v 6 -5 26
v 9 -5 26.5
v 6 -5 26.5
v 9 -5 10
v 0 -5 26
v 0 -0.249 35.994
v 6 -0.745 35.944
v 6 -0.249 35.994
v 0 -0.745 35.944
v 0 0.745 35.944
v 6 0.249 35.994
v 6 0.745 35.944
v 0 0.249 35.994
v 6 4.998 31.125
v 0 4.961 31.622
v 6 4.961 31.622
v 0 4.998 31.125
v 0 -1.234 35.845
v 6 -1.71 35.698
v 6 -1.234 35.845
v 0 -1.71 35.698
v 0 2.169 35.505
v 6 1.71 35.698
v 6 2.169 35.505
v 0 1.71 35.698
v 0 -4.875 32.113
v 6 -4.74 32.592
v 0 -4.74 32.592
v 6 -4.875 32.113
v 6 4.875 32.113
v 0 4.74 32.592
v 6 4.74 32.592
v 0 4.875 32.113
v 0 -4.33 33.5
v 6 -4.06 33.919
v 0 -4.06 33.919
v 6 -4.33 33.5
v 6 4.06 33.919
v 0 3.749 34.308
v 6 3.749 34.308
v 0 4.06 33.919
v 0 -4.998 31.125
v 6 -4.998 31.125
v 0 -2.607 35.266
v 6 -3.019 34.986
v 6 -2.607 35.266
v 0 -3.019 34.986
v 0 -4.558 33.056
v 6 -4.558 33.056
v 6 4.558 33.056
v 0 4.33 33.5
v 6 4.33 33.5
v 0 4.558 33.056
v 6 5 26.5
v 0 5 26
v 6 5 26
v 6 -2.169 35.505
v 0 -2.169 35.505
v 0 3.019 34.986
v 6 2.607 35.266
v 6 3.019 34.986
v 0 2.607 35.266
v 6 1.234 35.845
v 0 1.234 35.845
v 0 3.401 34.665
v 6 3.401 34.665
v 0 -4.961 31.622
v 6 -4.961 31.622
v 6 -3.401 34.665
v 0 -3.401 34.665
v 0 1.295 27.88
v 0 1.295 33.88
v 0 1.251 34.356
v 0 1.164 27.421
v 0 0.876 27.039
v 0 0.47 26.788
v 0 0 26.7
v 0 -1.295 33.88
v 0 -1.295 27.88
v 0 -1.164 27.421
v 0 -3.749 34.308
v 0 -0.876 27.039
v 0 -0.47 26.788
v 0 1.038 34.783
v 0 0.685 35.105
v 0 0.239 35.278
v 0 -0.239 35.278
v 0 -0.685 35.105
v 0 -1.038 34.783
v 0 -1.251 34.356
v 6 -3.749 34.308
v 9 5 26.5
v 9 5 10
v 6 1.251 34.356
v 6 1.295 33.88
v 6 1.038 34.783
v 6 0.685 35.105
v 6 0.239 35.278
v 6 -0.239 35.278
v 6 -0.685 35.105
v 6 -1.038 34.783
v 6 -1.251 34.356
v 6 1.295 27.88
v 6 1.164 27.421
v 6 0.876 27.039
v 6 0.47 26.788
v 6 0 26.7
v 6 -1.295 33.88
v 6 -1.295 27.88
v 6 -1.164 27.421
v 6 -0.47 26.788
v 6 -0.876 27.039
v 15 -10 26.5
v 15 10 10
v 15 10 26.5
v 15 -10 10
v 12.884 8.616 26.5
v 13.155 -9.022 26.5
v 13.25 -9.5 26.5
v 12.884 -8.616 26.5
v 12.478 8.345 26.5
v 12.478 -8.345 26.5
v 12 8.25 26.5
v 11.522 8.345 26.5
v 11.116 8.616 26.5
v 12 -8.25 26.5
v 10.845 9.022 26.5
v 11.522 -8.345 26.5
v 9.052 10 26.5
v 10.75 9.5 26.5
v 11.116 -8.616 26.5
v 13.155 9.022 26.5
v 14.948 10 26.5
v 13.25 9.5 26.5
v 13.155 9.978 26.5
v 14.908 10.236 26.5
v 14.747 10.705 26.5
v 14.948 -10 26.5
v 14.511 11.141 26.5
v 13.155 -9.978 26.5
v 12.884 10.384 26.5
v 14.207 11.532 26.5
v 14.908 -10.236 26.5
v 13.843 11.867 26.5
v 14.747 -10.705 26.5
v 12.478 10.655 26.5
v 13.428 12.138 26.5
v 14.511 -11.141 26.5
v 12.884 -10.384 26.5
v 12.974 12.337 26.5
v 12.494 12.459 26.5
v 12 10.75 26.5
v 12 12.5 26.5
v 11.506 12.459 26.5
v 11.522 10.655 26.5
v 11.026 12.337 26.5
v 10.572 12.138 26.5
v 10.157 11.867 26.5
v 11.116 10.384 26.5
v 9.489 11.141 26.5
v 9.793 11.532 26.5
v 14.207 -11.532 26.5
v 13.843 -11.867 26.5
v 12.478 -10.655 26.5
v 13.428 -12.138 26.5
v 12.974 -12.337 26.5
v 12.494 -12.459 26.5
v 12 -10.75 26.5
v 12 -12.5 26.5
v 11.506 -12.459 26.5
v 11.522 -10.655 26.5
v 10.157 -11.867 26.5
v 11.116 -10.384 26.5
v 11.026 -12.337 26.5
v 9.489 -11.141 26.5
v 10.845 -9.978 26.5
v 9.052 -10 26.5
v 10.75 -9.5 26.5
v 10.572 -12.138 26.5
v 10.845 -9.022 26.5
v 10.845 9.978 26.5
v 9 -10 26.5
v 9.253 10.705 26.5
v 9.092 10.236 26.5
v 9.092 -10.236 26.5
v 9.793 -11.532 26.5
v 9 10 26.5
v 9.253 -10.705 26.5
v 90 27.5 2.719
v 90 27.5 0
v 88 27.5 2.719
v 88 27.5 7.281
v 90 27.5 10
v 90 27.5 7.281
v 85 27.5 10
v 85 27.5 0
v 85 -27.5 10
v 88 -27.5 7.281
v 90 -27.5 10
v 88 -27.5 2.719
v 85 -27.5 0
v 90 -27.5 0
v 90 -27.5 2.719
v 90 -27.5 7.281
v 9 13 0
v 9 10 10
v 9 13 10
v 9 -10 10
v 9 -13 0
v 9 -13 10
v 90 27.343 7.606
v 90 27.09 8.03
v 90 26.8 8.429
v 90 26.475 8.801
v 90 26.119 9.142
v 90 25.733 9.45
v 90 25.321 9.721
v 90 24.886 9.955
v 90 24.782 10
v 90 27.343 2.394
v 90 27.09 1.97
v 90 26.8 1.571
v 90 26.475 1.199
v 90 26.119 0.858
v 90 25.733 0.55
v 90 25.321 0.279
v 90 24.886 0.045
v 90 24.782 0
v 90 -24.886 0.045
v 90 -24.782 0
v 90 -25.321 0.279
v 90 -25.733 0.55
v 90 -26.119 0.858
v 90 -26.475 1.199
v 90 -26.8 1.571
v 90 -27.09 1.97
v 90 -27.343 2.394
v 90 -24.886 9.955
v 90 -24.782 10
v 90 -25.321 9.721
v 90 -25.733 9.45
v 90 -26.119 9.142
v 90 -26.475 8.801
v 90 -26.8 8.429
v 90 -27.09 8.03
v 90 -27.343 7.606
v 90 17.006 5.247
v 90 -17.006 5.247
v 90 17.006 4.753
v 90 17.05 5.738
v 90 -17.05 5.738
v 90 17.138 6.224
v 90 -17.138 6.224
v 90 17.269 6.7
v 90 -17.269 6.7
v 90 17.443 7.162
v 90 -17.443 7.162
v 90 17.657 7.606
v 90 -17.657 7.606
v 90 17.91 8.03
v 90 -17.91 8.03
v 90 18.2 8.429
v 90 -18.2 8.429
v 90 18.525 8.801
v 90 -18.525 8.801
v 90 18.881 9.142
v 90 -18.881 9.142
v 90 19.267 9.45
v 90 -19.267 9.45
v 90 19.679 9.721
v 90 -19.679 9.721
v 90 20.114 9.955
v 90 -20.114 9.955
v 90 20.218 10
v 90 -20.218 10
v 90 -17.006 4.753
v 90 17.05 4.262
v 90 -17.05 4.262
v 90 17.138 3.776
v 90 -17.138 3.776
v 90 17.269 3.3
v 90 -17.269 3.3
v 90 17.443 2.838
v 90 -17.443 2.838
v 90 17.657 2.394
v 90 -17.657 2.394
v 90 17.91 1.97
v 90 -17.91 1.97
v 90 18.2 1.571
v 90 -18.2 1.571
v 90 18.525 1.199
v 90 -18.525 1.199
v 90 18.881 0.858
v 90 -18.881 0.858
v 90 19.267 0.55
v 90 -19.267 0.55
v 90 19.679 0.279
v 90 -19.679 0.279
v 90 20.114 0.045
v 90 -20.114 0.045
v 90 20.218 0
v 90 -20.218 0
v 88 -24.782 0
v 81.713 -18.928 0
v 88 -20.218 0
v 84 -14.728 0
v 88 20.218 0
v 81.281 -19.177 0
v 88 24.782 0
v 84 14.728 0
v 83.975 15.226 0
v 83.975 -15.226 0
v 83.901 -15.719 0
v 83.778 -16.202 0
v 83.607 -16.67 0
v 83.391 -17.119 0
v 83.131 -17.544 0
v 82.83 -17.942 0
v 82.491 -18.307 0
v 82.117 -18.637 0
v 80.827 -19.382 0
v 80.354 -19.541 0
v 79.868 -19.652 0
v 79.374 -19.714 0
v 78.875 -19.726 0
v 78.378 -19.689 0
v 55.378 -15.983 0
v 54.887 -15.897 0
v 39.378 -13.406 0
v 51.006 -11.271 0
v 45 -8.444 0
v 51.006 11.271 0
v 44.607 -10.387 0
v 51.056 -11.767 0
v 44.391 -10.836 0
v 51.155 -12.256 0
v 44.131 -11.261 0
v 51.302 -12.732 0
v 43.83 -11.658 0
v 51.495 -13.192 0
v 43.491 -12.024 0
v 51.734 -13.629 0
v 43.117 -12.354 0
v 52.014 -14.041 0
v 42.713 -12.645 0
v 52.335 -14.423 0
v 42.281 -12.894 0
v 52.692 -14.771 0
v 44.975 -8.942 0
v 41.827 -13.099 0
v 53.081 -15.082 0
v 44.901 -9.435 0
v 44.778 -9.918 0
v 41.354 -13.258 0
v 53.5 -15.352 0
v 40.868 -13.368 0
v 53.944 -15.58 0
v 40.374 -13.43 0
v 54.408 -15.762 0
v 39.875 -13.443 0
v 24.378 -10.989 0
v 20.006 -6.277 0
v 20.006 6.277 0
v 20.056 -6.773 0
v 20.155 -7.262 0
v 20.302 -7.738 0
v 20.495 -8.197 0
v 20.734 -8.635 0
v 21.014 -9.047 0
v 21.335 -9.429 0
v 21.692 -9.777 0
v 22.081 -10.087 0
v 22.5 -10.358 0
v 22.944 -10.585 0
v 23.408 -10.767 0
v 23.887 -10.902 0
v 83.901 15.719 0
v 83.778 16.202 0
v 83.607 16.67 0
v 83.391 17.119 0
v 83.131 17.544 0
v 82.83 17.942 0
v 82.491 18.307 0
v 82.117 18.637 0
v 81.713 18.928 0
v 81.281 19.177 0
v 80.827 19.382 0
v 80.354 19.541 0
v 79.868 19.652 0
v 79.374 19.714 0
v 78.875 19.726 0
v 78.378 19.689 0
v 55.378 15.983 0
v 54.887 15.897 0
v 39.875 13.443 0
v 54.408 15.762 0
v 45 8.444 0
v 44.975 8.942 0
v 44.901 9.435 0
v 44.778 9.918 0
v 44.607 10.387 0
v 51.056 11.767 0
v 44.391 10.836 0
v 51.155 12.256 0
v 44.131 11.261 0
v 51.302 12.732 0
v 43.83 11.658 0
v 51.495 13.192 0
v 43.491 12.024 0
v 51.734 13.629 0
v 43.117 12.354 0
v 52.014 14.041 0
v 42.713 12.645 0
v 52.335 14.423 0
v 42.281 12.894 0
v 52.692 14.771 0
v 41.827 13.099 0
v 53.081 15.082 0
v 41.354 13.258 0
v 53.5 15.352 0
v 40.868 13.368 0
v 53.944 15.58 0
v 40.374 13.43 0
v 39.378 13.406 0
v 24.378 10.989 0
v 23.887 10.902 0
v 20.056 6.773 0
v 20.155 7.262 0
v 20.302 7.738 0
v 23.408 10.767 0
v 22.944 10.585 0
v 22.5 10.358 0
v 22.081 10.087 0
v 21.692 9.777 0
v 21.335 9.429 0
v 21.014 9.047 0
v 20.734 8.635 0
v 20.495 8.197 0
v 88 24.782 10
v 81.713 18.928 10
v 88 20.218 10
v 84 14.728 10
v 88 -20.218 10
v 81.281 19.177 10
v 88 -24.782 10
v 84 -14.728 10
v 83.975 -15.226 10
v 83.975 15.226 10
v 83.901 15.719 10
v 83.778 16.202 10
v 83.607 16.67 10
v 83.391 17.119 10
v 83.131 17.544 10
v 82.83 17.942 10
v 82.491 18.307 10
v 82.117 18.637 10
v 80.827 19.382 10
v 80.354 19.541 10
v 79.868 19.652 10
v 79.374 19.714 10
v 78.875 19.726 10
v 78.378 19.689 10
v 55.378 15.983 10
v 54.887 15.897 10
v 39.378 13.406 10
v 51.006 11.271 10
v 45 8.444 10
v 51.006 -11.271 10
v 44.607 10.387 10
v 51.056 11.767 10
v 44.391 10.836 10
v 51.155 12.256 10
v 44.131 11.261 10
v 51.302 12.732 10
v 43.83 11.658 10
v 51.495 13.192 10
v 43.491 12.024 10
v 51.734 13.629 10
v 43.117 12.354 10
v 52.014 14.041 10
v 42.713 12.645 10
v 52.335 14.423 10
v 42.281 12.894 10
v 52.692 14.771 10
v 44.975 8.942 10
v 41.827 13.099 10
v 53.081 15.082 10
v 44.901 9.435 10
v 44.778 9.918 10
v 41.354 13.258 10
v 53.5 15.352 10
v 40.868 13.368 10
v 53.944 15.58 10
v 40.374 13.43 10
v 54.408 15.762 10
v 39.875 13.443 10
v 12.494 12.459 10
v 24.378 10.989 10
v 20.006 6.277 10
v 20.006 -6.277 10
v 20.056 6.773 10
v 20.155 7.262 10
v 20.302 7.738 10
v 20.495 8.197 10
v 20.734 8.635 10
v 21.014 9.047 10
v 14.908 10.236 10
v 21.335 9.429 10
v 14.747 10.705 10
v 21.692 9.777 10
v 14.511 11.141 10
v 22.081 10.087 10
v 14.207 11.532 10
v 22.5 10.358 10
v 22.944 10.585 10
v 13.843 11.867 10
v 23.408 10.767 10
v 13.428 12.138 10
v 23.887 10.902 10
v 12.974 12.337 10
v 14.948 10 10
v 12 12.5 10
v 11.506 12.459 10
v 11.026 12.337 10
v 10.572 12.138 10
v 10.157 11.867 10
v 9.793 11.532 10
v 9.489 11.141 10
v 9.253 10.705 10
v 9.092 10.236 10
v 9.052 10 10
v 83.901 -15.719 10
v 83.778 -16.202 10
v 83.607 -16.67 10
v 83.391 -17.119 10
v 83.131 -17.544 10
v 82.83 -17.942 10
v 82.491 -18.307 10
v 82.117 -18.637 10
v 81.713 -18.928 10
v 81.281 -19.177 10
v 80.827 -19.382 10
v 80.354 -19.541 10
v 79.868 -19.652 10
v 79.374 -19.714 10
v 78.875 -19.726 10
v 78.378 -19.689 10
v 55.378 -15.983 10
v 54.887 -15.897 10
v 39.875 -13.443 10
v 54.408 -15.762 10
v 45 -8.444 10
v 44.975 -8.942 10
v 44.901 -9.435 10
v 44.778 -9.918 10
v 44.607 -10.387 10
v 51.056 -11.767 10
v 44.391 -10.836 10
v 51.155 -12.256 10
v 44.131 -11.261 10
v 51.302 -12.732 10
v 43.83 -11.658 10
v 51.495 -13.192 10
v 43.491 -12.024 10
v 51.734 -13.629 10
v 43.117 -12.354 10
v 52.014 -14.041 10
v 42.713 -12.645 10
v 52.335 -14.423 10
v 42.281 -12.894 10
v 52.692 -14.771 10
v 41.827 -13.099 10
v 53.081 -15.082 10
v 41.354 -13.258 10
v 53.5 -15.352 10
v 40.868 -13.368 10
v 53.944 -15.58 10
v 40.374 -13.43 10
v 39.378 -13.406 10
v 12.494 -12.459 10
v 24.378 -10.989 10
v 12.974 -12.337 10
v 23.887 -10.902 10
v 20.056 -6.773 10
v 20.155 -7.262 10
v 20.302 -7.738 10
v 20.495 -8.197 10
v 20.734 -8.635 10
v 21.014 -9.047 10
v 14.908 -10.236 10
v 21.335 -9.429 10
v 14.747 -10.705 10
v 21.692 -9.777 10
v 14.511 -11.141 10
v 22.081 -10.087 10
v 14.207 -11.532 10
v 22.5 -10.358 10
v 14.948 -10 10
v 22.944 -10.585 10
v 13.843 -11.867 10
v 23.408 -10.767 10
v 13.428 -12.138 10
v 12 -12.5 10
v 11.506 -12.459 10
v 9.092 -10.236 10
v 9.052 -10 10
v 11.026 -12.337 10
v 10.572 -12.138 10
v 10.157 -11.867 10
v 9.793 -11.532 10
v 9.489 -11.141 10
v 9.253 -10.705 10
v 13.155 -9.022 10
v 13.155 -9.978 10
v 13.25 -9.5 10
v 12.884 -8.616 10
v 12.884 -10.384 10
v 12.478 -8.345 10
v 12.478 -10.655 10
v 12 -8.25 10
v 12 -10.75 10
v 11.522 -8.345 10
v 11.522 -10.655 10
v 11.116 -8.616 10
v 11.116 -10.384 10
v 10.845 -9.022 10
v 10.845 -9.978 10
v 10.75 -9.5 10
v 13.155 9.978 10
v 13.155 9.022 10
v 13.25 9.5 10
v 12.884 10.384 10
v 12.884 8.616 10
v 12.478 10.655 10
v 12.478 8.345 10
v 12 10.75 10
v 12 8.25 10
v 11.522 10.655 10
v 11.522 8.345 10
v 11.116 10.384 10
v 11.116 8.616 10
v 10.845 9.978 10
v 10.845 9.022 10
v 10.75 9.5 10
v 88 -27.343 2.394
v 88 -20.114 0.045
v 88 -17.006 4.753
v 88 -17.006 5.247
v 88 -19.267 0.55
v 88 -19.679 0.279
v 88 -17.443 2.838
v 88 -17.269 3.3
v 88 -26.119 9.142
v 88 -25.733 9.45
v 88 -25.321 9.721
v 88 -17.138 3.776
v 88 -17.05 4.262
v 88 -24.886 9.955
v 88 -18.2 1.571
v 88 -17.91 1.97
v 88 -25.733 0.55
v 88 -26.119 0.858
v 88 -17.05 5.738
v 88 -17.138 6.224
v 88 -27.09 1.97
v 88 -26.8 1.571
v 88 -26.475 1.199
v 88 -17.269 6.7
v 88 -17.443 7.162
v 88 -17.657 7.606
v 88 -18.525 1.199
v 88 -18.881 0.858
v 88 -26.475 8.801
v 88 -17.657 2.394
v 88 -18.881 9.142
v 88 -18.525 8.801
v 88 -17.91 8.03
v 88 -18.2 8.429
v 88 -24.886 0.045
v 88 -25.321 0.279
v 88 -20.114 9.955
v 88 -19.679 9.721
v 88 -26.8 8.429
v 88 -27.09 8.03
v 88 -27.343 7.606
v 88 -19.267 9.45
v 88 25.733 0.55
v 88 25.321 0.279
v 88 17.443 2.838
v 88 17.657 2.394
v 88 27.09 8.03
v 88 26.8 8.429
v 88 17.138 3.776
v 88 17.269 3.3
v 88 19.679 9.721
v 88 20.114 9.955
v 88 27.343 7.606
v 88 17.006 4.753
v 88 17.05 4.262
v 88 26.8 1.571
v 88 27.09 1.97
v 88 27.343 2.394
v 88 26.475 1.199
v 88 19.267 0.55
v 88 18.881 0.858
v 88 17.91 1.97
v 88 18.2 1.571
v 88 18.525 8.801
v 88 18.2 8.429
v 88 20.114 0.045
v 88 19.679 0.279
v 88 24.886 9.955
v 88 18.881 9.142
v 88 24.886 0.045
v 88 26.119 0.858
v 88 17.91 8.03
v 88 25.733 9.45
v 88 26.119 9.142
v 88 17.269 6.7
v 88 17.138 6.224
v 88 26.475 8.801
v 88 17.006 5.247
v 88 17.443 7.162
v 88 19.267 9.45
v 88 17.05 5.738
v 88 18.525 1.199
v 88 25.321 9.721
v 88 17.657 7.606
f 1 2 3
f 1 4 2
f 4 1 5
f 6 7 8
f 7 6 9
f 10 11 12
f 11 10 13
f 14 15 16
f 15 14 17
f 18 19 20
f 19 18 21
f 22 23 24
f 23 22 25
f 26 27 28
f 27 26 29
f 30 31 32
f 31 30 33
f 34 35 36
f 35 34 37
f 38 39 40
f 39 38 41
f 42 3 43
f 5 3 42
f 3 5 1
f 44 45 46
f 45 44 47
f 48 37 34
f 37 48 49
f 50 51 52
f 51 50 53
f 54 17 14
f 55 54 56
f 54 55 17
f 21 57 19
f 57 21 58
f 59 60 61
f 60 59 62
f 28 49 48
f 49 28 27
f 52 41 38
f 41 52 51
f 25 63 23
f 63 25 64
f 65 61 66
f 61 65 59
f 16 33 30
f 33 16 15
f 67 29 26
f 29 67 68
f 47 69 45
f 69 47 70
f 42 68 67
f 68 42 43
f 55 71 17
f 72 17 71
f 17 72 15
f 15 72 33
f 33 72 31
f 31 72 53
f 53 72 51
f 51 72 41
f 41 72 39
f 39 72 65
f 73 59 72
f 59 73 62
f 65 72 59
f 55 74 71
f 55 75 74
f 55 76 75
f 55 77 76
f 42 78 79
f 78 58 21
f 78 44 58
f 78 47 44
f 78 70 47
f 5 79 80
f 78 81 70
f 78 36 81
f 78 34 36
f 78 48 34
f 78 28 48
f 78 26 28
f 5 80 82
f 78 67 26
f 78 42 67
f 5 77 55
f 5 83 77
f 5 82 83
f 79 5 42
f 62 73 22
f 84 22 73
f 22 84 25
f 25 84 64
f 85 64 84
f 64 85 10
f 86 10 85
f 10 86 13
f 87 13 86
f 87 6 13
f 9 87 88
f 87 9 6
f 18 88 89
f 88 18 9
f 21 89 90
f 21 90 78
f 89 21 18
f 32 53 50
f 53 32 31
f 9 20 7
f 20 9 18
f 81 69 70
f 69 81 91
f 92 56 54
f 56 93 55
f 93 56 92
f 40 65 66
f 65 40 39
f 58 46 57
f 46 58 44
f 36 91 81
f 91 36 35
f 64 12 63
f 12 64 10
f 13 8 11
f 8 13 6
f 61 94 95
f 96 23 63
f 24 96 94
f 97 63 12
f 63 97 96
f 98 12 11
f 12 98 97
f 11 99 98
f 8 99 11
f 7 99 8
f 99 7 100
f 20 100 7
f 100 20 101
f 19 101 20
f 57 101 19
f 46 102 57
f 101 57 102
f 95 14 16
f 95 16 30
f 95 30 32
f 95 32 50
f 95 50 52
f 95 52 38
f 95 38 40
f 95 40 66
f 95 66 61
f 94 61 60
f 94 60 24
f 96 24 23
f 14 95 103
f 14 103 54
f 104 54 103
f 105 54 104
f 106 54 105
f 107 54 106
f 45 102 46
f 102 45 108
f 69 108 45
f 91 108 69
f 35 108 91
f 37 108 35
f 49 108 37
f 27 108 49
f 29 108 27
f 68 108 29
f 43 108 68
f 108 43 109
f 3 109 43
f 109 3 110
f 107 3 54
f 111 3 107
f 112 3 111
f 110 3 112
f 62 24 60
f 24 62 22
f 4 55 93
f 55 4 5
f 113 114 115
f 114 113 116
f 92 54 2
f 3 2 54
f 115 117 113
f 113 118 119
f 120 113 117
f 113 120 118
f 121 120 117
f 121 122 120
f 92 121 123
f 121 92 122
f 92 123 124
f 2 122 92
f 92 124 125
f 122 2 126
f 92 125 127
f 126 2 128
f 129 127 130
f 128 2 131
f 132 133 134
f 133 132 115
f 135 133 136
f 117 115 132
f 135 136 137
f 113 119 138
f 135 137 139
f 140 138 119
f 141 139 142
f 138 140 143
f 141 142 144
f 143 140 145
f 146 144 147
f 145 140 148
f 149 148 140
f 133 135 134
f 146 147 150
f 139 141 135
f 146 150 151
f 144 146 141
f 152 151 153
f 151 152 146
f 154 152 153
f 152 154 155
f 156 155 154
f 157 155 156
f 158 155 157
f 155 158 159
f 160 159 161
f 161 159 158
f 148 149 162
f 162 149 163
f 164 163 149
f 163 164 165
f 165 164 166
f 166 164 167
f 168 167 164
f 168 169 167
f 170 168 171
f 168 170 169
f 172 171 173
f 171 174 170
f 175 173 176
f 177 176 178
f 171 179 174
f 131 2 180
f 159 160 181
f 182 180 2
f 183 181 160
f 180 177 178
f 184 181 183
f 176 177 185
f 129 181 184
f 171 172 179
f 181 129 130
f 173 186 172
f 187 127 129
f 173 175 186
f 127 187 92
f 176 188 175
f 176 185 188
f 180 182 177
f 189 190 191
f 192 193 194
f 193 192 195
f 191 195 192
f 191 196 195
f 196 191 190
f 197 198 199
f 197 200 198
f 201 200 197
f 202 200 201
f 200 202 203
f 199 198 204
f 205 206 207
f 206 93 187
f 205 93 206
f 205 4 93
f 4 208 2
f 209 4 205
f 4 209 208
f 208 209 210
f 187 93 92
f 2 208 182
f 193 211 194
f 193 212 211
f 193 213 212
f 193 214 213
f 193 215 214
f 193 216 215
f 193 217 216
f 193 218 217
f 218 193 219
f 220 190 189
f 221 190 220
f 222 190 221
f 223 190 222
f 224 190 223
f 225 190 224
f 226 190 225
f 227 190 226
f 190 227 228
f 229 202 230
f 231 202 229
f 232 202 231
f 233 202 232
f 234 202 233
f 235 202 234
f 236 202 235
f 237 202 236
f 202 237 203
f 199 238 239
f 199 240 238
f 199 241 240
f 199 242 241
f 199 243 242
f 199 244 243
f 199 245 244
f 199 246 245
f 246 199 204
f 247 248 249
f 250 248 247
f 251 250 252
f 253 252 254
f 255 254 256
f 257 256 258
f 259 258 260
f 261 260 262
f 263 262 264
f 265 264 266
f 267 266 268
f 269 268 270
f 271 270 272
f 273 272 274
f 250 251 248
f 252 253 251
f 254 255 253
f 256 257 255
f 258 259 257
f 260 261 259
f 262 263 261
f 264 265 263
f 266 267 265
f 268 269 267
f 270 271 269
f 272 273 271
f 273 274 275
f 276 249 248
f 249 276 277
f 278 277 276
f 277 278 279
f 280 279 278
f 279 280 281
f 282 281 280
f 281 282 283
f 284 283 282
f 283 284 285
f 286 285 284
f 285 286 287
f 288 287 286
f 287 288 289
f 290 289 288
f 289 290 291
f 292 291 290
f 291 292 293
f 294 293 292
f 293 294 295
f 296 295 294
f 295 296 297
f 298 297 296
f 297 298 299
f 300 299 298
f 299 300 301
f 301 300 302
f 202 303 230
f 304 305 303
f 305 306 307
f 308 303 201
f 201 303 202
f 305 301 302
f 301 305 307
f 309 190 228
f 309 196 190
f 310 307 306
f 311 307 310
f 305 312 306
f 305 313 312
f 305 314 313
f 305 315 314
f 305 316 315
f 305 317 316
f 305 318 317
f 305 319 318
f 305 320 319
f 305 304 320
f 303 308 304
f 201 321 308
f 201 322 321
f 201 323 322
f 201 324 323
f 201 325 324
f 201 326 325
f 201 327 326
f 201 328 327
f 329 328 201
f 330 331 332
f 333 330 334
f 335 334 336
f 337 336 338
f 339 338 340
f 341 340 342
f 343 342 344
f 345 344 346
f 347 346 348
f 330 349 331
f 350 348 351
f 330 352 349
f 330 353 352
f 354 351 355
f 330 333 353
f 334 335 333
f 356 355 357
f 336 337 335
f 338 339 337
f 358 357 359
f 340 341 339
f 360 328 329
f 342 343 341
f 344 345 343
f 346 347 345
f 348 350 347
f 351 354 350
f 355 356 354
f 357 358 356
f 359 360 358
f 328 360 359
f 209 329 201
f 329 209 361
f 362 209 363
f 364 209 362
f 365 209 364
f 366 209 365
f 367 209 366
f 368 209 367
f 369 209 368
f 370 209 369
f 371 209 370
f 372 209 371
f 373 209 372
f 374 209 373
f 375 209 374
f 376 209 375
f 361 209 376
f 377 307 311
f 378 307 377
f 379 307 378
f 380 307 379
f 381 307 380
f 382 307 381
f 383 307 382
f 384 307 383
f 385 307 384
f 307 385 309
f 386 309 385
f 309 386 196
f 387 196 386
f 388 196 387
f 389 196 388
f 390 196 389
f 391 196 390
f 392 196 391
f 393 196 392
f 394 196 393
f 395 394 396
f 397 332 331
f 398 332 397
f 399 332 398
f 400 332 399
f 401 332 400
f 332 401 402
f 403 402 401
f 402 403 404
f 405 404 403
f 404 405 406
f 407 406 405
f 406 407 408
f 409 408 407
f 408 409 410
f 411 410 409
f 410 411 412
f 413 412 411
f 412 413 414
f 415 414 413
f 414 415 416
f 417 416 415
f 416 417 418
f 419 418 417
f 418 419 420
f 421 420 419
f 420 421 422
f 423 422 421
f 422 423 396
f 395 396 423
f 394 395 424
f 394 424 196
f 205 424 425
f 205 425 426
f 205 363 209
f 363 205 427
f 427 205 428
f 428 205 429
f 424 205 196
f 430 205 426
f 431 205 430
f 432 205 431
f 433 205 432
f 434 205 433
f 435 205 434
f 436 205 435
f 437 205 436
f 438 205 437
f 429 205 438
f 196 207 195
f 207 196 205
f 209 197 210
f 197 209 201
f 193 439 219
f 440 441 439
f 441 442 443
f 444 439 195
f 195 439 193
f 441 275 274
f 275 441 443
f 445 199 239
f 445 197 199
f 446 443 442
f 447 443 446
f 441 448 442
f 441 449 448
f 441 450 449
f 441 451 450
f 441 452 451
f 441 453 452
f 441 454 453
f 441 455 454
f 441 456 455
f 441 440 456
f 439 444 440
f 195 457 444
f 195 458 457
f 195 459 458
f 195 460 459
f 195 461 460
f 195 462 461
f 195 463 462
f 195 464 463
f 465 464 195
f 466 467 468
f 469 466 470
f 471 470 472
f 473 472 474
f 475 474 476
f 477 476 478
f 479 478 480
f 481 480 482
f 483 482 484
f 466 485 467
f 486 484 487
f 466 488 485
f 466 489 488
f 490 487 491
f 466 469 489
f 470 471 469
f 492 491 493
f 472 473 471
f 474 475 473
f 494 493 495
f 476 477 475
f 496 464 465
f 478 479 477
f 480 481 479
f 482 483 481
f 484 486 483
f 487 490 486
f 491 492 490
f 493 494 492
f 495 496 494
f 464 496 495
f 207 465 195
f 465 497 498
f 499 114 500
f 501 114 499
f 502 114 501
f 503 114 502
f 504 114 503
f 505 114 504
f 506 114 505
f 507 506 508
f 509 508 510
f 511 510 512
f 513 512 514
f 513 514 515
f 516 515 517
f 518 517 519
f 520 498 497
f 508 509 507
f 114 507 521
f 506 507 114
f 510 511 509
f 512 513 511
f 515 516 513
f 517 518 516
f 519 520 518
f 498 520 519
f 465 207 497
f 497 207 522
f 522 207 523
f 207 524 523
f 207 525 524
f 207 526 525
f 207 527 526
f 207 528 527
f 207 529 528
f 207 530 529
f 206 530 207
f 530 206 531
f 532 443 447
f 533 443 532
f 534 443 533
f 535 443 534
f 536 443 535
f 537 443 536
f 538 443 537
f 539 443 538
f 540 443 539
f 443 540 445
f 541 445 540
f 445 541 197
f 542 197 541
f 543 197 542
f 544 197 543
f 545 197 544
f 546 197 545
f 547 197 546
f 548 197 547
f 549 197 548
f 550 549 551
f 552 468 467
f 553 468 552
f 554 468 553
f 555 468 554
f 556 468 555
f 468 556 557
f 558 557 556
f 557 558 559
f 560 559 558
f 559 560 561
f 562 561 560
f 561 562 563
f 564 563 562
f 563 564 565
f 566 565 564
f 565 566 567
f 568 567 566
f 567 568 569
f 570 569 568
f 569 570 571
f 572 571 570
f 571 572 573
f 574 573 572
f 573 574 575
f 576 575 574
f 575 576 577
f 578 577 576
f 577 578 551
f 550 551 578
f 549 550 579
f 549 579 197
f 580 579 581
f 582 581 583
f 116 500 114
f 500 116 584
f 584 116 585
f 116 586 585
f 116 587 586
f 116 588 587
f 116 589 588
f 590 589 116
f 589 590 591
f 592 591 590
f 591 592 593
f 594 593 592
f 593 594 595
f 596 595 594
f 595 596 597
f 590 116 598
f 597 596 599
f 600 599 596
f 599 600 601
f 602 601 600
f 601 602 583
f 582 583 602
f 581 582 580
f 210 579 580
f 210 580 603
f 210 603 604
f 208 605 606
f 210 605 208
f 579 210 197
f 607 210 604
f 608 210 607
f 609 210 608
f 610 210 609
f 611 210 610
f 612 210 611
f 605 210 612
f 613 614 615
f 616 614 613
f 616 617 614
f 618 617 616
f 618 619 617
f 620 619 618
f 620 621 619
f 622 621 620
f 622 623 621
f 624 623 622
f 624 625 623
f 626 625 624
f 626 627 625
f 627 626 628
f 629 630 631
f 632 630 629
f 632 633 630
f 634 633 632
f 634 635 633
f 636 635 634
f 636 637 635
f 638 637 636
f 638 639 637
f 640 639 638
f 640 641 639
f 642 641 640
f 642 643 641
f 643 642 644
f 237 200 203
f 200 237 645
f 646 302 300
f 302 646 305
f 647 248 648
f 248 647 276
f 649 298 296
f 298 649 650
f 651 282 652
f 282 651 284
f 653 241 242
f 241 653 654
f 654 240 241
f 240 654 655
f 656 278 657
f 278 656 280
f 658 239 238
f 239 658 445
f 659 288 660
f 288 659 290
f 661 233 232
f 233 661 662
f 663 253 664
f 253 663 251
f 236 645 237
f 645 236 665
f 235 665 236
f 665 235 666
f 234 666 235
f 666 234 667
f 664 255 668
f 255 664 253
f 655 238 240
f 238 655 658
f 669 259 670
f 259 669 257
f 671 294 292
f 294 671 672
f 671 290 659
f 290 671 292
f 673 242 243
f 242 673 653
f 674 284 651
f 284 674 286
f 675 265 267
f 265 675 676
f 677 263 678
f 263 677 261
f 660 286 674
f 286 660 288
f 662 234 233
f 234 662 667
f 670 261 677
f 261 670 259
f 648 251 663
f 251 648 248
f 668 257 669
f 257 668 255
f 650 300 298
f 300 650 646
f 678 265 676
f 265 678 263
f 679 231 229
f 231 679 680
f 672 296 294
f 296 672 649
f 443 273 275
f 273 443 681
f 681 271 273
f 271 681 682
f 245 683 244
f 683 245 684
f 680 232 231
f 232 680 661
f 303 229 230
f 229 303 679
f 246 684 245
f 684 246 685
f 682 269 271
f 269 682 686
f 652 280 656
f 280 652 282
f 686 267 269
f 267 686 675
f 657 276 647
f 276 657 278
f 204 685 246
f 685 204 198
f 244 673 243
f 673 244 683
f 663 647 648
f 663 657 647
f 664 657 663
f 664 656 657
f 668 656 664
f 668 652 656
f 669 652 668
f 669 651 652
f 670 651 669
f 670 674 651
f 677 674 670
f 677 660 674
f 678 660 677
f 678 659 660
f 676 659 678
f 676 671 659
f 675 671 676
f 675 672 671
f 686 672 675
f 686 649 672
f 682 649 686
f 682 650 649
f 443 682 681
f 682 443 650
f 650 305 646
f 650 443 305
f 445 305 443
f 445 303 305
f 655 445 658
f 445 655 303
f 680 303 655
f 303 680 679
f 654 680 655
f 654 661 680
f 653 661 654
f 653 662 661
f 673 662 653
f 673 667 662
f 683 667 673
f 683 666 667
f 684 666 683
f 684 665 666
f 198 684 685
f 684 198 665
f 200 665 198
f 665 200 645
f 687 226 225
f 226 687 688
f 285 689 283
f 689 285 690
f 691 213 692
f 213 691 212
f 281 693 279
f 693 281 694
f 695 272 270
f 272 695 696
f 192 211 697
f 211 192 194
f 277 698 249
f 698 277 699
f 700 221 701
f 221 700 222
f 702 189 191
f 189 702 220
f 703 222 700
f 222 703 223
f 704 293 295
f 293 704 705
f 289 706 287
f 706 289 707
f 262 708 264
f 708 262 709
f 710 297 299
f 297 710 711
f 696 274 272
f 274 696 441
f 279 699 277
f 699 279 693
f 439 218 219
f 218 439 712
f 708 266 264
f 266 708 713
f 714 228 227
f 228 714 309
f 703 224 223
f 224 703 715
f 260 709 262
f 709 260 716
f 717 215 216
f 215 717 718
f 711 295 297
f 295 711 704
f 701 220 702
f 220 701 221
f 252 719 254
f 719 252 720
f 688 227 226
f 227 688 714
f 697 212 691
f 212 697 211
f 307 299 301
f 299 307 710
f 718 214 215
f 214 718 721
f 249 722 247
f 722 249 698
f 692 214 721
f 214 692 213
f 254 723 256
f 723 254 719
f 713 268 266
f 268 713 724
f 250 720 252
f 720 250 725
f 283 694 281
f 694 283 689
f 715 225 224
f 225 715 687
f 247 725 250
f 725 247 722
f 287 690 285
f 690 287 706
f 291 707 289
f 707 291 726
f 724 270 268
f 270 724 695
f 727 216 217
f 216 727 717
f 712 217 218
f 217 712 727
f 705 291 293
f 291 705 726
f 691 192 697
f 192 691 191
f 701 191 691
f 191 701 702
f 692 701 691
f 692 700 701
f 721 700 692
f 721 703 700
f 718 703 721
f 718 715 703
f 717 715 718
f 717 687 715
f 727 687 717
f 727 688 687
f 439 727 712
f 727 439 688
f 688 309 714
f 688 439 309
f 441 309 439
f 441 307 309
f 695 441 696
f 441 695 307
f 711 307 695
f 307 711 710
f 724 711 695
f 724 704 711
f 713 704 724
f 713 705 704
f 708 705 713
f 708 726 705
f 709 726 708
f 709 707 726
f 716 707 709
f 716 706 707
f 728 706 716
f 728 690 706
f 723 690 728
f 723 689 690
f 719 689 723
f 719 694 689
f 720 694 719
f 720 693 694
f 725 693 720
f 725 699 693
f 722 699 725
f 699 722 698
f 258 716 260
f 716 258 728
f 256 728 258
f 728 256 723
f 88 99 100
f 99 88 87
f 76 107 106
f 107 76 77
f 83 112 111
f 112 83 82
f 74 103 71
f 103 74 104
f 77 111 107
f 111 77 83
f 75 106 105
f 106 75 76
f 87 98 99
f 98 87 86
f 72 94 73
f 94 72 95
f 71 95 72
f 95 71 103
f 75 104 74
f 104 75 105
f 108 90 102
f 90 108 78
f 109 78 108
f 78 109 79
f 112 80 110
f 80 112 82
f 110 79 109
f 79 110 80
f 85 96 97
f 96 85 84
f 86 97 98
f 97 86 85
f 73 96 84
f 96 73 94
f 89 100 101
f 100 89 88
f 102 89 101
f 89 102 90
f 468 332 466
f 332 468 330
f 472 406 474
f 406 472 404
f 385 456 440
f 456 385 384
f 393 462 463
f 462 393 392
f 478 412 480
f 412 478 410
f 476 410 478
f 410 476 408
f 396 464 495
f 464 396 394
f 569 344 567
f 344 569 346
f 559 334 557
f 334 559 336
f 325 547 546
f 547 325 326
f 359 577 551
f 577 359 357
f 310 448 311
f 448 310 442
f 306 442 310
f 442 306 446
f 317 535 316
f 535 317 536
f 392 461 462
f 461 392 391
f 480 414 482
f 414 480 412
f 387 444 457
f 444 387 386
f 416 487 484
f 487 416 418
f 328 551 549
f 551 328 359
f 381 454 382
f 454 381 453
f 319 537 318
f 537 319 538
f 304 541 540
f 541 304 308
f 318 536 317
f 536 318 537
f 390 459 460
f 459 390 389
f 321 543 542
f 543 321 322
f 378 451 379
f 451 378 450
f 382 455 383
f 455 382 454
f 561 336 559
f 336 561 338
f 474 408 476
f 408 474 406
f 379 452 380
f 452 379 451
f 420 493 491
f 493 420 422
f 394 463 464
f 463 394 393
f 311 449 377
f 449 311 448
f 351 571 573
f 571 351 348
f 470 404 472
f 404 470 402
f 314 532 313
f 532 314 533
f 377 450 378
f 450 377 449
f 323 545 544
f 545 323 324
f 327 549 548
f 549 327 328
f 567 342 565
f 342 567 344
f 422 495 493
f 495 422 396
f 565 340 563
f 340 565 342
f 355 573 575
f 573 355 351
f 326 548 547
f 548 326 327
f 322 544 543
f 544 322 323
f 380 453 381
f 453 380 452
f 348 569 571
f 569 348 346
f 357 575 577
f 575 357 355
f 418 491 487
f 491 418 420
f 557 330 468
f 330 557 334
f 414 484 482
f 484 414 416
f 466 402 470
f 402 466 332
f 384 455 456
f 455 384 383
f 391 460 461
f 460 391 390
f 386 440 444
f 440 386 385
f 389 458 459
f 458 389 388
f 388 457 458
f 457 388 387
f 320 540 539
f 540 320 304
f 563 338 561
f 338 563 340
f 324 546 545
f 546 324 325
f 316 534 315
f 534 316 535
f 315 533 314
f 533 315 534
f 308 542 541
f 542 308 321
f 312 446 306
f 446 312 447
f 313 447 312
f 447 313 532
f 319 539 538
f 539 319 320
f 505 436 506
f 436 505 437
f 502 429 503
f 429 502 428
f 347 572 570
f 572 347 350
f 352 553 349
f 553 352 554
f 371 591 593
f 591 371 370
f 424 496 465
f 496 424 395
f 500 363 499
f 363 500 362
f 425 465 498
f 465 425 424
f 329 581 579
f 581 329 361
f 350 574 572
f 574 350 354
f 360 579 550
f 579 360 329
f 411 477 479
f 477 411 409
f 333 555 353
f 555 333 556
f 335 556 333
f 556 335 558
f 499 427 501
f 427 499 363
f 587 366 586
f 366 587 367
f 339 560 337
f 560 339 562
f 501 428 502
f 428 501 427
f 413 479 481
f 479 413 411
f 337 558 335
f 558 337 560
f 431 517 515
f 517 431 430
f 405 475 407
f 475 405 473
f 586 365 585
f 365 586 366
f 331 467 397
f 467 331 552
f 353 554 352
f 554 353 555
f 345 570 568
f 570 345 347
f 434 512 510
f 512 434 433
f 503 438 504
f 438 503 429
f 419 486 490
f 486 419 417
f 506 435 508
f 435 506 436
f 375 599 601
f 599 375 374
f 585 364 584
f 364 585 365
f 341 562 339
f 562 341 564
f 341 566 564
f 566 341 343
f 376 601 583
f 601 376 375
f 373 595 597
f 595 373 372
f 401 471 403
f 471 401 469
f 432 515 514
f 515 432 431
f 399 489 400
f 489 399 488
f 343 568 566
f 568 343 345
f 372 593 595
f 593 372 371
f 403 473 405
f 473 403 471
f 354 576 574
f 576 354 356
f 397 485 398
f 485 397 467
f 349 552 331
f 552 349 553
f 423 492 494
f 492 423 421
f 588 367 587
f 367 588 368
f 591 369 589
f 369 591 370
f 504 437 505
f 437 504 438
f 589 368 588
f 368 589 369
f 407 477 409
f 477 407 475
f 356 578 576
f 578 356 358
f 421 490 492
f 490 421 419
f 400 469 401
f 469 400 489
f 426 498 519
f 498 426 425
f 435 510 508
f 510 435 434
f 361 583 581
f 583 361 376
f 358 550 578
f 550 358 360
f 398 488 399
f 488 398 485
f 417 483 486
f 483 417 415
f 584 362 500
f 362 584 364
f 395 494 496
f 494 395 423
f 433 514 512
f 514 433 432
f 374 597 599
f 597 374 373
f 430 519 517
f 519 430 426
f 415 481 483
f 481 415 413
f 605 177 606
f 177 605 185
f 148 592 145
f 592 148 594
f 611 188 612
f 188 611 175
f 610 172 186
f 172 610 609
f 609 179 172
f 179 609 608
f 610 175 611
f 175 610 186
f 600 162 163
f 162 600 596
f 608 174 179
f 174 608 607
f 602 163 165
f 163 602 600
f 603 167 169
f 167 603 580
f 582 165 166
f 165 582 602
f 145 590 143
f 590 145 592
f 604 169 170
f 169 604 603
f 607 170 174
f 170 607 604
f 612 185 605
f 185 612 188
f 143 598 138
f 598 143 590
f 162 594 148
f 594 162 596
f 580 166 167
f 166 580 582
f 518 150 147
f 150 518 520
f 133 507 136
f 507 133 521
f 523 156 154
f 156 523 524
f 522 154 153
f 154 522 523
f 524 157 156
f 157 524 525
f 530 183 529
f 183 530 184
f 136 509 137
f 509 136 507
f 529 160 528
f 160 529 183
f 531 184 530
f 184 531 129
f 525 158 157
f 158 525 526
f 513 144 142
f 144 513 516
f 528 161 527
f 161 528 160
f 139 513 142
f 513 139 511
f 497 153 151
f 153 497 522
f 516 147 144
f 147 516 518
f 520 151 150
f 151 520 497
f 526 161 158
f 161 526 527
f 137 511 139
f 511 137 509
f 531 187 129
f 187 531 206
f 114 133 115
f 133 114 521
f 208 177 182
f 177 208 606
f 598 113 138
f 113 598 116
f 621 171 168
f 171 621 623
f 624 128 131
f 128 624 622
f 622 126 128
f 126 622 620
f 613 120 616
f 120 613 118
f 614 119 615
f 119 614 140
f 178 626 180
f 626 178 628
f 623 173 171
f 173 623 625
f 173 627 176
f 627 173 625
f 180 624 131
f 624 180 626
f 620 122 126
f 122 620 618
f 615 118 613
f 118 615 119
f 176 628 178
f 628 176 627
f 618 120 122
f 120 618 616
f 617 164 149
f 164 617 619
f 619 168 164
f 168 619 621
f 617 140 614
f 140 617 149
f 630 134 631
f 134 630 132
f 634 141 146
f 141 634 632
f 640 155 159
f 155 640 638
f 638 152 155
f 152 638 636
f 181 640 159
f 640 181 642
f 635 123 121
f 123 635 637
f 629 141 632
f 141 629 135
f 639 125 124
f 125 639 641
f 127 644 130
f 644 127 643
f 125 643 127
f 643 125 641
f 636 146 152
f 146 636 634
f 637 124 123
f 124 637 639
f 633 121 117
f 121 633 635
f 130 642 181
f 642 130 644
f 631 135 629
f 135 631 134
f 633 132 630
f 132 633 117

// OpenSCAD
/*[Part]*/

//Choose true to only print the probe pin
Print = "probe"; //[probe: z-probe, pin: probing pin, both: both, nopin: z-probe without probe attachement]

/*[Probe holder]*/
//Overall height
height = 90;  

//Depth of bridge
depth1 = 10;   

//Depth of probe holder
depth2 = 6;   

//Width of upper bridge part
length1 = 55; 

//Width of lower bridge part
length2 = 26; 

//Width of probe holder (should be at least 2*r_probe + 2)
length3 = 10; 

// = Delta_Effector_Offset
offset = 26;  

//Adapt to your design (trial & error, the less the factor, the less material is printed)
savematerial = 1.1; 

//choose a little bit bigger than actual magnet diameter
magnetdia = 11;

//choose a little bit smaller than actual magnet depth
magnetdepth = 1; 
//seperation of magnets
magnetsep = 45; 

/*[Probe pin]*/

//Depth of probe pin
r_probe = 4; 

//Overall thickness
d_probe = 1; 

//Probe pin height, choose rather short, 2 mm'ish
h_pin = 2.5; 

//Clearance between probe pin and probe hole (on each side); should be a loose fit;
clearance = 0.3; 


/*[Hidden]*/
$fs = 0.5; //0.2 for production, 1 for draft;
$fa = 2; //0.5 for production, 2 for draft;

//Deducted variables
hfz = offset + depth1/2; //height from zero
rn = depth2; //radius of lower part to nailholder 
h_probe = depth2; //cross_radius
r_pin = d_probe; //pin radius




//###main###

if(Print == "pin"){probe_pin();}
else{

  //Bridge
  difference(){
  union(){
    hull(){
    translate ([depth2+3.5,0,depth1/2]) cube([1,length2,depth1],center = true);
     translate ([height-2.5,0,depth1/2]) cube([5,length1,depth1],center = true);
      }
      

    
    //probe pin holder
   if(Print != "nopin"){
     translate ([depth2/2,0,hfz/2]) 
     union()
      { hull(){
        translate([0,0,hfz/2-length3/2])
        cube([depth2,length3,.001],center=true);
        translate([0,0,hfz/2]) rotate([0,90,0]) cylinder(r=            length3/2, h=depth2, center = true);
        }
        hull(){
        translate([0,0,hfz/2-length3/2])
        cube([depth2,length3,.001],center=true);
        translate([depth2+3,0,-hfz/2+depth1])
        cube([depth2,length3,.001],center=true);
        }
      }
    
    translate([depth2+3,0,(hfz+11)/2])         cube([6,length3,hfz-20],center=true);
    }
        
      //Bridge lower part
      //translate([1.5*rn,-length2/2+rn,depth1/2]) cylinder(r=rn, h=depth1, center = true);
        
      //translate([1.5*rn,length2/2-rn,depth1/2]) cylinder(r=rn, h=depth1, center = true);
        
      //translate([depth2,0,depth1/2]) cube([depth2,length2-2*rn,depth1], center = true);
    }
    

    
    
  //Probe hole
    translate ([-1,0,hfz]) rotate([0,90,0]) probe_cut();
    
  //Material saving
    hull(){
      for (x=[height-depth1*savematerial,height/2+depth1*savematerial]) {
        tempy=(length2+(length1-length2)*x/height)/2;
        for (y=[tempy-depth1*savematerial,-(tempy-depth1*savematerial)]) {
          translate([x,y,depth1/2])
          cylinder(r=depth1/2,h=depth1+1,center=true);
        }}}
      
      hull(){
      for (x=[height/2-depth1/2,4+depth1+depth1*savematerial]) {
        tempy=(length2+(length1-length2)*x/height)/2;
        for (y=[tempy-depth1*savematerial,-(tempy-depth1*savematerial)]) {
          translate([x,y,depth1/2])
          cylinder(r=depth1/2,h=depth1+1,center=true);
        }}}
    
   //Magnets
  for(y=[-magnetsep/2,magnetsep/2]) 
    translate([height-magnetdepth,y,depth1/2])
    rotate([0,90,0])
    cylinder(r=magnetdia/2,h=magnetdepth+1,center=true);
  
  //Extramagnets
    for(y=[-magnetsep/2,magnetsep/2]) 
    translate([height-magnetdepth,y,depth1/2+magnetdia*1.2])
    rotate([0,90,0])
    cylinder(r=magnetdia/2,h=magnetdepth+1,center=true);
  
  //Pin
  }



  //Endstop holder
  translate([depth2+6,0,0]) holder();

  if(Print == "both"){translate([-r_probe*2,0,0]) rotate([0,0,90]) probe_pin();}

}  



//###modules###
module holder() {
    rotate([0,0,90]) translate([0,0,hfz/2]){
        //translate ([0,6,0])
          //  cube([length3,6,hfz-9],center=true);
    difference(){
        union(){
            translate([-19/2,0,0]) cylinder(r=3,h=hfz-9,center=true);
    translate([19/2,0,0]) cylinder(r=3,hfz-9,center=true);
    cube([20,6,hfz-9], center = true);
        }
    translate([-19/2,0,0]) cylinder(r=1.25,h=hfz,center=true);
    translate([19/2,0,0]) cylinder(r=1.25,hfz,center=true);
    }}}

module probe_pin(){
  translate([0,0,h_probe/2+1])
  union(){
    translate([0,0,h_probe/2]) cylinder(r=r_pin, h= h_pin);
    
    minkowski(){
      union(){
      cube([(r_probe-d_probe)*2,.001,h_probe-0.001], center=true);
      };
      cylinder(r=d_probe,h=0.001, center=true);}
      
    translate([0,0,-h_probe/2-0.5])
      difference(){
      union(){minkowski(){
      cube([(r_probe-d_probe)*2,0.001,0.001], center=true);
      cylinder(r=d_probe*2,h=1, center=true);}}
      translate([r_probe,-d_probe*2,-d_probe*2]) cube(d_probe*4,d_probe*4,d_probe*2);}
      }
      
    }
  
 module probe_cut(){
  translate([0,0,h_probe/2+1])
  union(){
    
    minkowski(){
      cube([(r_probe-d_probe)*2,.001,2*h_probe-0.001], center=true);
      cylinder(r=d_probe+clearance,h=0.001, center=true);
    }}}
  
